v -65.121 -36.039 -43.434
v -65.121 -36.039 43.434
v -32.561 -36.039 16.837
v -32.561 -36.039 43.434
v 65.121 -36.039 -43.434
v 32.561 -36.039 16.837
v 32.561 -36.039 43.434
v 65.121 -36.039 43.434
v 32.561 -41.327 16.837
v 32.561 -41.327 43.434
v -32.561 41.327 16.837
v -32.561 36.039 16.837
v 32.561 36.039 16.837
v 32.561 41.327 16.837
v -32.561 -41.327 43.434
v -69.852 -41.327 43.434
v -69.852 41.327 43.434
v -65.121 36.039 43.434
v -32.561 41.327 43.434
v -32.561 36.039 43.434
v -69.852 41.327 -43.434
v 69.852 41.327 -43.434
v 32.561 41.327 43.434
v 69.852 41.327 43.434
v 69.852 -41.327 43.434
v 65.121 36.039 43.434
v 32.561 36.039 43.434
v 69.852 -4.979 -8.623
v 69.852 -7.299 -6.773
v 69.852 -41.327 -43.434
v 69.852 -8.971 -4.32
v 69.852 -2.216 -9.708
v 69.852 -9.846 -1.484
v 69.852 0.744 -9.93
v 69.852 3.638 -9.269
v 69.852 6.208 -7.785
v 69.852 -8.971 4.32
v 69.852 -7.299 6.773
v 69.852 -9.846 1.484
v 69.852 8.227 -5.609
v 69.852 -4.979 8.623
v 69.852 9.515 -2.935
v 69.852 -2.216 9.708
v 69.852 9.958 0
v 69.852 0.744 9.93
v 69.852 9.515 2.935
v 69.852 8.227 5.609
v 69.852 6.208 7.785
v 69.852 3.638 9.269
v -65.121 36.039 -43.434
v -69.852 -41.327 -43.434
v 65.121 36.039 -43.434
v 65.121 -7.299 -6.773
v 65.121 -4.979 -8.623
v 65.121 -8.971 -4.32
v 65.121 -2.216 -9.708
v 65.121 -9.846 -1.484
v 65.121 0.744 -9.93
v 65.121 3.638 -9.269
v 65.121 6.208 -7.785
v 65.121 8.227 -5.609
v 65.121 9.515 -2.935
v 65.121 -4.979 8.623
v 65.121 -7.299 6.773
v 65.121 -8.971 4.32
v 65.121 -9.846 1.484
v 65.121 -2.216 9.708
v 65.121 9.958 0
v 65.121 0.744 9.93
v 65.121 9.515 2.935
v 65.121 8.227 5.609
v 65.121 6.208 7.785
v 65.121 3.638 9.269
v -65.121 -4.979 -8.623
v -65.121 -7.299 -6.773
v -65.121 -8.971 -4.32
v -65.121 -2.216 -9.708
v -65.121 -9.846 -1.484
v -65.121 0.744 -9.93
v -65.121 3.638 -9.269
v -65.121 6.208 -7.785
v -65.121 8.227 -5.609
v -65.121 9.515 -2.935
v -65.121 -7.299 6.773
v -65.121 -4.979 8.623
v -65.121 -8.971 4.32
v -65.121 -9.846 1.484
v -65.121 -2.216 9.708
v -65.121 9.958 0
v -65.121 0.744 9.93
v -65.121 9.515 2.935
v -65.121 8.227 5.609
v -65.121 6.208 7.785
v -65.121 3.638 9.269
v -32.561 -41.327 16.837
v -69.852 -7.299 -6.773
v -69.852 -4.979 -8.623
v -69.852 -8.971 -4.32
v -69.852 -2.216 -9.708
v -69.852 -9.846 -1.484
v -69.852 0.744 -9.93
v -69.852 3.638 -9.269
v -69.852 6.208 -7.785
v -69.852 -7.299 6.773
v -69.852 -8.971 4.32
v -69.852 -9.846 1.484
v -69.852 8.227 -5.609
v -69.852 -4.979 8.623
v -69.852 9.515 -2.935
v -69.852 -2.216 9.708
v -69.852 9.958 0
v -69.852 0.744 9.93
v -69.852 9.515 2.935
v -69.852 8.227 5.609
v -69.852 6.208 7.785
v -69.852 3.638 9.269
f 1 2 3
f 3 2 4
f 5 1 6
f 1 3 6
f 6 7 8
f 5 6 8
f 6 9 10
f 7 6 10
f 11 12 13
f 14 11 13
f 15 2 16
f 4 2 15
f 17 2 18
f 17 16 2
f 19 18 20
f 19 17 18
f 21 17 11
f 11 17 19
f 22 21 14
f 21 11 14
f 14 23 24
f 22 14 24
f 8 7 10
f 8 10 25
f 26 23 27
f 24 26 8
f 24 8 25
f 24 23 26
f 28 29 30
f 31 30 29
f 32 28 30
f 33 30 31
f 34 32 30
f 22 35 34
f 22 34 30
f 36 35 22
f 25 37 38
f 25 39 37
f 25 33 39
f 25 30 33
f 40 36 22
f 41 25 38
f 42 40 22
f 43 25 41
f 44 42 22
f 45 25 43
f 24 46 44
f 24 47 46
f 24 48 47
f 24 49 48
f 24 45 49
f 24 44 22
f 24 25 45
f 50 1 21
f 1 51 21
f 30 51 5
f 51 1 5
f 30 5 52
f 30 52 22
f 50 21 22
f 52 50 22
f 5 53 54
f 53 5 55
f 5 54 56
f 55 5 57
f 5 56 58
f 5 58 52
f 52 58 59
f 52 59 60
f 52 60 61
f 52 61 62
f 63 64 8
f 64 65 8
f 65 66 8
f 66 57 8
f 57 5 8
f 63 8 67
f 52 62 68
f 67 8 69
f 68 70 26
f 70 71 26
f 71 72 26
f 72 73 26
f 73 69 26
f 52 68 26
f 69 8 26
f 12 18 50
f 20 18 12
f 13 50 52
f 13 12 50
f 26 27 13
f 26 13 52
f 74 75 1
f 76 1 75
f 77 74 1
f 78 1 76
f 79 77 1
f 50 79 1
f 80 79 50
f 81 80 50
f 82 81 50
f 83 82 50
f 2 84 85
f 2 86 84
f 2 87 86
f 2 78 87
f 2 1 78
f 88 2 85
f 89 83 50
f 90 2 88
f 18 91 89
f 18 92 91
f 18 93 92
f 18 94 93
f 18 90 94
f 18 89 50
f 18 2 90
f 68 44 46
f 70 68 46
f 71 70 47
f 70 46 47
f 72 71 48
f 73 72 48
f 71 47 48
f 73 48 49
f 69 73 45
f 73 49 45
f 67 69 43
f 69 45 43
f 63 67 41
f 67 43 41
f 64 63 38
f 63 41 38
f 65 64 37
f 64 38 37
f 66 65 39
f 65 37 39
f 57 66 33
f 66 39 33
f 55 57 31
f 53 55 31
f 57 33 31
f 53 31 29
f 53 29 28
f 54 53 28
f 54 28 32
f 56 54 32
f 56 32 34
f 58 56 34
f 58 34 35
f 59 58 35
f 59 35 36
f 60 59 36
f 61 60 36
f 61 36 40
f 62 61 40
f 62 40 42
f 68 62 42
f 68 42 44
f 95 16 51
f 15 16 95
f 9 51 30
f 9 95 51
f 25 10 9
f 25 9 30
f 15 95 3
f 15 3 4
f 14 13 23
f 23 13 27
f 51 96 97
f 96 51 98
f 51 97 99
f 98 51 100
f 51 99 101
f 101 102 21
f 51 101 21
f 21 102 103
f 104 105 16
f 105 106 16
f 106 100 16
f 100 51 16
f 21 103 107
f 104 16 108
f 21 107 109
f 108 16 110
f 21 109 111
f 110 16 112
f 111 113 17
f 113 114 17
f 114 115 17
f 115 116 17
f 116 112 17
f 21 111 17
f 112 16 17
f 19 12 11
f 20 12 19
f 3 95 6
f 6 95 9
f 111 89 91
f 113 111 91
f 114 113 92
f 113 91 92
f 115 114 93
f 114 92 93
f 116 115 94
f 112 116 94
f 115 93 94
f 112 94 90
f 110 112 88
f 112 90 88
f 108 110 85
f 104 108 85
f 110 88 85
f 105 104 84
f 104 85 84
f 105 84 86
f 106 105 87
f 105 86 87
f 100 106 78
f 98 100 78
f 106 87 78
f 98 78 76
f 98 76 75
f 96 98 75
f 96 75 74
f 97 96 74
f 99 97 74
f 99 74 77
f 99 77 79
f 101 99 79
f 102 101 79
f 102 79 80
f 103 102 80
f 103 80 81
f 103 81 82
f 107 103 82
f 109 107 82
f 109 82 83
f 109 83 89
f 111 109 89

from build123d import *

# Parameters (mm, degrees)
F0_W     = 139.704422
F0_H     = 82.653814
F0_W_2   = 130.242362
F0_H_2   = 72.07857
F1_DEPTH = 43.434
F2_R     = 9.957557
F3_DEPTH = 170.434
F4_W     = 65.121188
F4_H     = 53.194226
F5_DEPTH = 111.252


with BuildPart() as f1:
    # F0 (on Top) → F1 (new body, symmetric)
    with BuildSketch(Plane.XY):
        Rectangle(F0_W, F0_H)
        Rectangle(F0_W_2, F0_H_2, mode=Mode.SUBTRACT)
    extrude(amount=F1_DEPTH, both=True)

    # F2 (on face) → F3 (cut)
    with BuildSketch(Plane.YZ.offset(69.852211)):
        Circle(F2_R)
    extrude(amount=-F3_DEPTH, mode=Mode.SUBTRACT)

    # F4 (on face) → F5 (cut)
    with BuildSketch(Plane.XZ.offset(41.326907)):
        with Locations((0, 43.434)):
            Rectangle(F4_W, F4_H)
    extrude(amount=-F5_DEPTH, mode=Mode.SUBTRACT)


solid = f1.part
